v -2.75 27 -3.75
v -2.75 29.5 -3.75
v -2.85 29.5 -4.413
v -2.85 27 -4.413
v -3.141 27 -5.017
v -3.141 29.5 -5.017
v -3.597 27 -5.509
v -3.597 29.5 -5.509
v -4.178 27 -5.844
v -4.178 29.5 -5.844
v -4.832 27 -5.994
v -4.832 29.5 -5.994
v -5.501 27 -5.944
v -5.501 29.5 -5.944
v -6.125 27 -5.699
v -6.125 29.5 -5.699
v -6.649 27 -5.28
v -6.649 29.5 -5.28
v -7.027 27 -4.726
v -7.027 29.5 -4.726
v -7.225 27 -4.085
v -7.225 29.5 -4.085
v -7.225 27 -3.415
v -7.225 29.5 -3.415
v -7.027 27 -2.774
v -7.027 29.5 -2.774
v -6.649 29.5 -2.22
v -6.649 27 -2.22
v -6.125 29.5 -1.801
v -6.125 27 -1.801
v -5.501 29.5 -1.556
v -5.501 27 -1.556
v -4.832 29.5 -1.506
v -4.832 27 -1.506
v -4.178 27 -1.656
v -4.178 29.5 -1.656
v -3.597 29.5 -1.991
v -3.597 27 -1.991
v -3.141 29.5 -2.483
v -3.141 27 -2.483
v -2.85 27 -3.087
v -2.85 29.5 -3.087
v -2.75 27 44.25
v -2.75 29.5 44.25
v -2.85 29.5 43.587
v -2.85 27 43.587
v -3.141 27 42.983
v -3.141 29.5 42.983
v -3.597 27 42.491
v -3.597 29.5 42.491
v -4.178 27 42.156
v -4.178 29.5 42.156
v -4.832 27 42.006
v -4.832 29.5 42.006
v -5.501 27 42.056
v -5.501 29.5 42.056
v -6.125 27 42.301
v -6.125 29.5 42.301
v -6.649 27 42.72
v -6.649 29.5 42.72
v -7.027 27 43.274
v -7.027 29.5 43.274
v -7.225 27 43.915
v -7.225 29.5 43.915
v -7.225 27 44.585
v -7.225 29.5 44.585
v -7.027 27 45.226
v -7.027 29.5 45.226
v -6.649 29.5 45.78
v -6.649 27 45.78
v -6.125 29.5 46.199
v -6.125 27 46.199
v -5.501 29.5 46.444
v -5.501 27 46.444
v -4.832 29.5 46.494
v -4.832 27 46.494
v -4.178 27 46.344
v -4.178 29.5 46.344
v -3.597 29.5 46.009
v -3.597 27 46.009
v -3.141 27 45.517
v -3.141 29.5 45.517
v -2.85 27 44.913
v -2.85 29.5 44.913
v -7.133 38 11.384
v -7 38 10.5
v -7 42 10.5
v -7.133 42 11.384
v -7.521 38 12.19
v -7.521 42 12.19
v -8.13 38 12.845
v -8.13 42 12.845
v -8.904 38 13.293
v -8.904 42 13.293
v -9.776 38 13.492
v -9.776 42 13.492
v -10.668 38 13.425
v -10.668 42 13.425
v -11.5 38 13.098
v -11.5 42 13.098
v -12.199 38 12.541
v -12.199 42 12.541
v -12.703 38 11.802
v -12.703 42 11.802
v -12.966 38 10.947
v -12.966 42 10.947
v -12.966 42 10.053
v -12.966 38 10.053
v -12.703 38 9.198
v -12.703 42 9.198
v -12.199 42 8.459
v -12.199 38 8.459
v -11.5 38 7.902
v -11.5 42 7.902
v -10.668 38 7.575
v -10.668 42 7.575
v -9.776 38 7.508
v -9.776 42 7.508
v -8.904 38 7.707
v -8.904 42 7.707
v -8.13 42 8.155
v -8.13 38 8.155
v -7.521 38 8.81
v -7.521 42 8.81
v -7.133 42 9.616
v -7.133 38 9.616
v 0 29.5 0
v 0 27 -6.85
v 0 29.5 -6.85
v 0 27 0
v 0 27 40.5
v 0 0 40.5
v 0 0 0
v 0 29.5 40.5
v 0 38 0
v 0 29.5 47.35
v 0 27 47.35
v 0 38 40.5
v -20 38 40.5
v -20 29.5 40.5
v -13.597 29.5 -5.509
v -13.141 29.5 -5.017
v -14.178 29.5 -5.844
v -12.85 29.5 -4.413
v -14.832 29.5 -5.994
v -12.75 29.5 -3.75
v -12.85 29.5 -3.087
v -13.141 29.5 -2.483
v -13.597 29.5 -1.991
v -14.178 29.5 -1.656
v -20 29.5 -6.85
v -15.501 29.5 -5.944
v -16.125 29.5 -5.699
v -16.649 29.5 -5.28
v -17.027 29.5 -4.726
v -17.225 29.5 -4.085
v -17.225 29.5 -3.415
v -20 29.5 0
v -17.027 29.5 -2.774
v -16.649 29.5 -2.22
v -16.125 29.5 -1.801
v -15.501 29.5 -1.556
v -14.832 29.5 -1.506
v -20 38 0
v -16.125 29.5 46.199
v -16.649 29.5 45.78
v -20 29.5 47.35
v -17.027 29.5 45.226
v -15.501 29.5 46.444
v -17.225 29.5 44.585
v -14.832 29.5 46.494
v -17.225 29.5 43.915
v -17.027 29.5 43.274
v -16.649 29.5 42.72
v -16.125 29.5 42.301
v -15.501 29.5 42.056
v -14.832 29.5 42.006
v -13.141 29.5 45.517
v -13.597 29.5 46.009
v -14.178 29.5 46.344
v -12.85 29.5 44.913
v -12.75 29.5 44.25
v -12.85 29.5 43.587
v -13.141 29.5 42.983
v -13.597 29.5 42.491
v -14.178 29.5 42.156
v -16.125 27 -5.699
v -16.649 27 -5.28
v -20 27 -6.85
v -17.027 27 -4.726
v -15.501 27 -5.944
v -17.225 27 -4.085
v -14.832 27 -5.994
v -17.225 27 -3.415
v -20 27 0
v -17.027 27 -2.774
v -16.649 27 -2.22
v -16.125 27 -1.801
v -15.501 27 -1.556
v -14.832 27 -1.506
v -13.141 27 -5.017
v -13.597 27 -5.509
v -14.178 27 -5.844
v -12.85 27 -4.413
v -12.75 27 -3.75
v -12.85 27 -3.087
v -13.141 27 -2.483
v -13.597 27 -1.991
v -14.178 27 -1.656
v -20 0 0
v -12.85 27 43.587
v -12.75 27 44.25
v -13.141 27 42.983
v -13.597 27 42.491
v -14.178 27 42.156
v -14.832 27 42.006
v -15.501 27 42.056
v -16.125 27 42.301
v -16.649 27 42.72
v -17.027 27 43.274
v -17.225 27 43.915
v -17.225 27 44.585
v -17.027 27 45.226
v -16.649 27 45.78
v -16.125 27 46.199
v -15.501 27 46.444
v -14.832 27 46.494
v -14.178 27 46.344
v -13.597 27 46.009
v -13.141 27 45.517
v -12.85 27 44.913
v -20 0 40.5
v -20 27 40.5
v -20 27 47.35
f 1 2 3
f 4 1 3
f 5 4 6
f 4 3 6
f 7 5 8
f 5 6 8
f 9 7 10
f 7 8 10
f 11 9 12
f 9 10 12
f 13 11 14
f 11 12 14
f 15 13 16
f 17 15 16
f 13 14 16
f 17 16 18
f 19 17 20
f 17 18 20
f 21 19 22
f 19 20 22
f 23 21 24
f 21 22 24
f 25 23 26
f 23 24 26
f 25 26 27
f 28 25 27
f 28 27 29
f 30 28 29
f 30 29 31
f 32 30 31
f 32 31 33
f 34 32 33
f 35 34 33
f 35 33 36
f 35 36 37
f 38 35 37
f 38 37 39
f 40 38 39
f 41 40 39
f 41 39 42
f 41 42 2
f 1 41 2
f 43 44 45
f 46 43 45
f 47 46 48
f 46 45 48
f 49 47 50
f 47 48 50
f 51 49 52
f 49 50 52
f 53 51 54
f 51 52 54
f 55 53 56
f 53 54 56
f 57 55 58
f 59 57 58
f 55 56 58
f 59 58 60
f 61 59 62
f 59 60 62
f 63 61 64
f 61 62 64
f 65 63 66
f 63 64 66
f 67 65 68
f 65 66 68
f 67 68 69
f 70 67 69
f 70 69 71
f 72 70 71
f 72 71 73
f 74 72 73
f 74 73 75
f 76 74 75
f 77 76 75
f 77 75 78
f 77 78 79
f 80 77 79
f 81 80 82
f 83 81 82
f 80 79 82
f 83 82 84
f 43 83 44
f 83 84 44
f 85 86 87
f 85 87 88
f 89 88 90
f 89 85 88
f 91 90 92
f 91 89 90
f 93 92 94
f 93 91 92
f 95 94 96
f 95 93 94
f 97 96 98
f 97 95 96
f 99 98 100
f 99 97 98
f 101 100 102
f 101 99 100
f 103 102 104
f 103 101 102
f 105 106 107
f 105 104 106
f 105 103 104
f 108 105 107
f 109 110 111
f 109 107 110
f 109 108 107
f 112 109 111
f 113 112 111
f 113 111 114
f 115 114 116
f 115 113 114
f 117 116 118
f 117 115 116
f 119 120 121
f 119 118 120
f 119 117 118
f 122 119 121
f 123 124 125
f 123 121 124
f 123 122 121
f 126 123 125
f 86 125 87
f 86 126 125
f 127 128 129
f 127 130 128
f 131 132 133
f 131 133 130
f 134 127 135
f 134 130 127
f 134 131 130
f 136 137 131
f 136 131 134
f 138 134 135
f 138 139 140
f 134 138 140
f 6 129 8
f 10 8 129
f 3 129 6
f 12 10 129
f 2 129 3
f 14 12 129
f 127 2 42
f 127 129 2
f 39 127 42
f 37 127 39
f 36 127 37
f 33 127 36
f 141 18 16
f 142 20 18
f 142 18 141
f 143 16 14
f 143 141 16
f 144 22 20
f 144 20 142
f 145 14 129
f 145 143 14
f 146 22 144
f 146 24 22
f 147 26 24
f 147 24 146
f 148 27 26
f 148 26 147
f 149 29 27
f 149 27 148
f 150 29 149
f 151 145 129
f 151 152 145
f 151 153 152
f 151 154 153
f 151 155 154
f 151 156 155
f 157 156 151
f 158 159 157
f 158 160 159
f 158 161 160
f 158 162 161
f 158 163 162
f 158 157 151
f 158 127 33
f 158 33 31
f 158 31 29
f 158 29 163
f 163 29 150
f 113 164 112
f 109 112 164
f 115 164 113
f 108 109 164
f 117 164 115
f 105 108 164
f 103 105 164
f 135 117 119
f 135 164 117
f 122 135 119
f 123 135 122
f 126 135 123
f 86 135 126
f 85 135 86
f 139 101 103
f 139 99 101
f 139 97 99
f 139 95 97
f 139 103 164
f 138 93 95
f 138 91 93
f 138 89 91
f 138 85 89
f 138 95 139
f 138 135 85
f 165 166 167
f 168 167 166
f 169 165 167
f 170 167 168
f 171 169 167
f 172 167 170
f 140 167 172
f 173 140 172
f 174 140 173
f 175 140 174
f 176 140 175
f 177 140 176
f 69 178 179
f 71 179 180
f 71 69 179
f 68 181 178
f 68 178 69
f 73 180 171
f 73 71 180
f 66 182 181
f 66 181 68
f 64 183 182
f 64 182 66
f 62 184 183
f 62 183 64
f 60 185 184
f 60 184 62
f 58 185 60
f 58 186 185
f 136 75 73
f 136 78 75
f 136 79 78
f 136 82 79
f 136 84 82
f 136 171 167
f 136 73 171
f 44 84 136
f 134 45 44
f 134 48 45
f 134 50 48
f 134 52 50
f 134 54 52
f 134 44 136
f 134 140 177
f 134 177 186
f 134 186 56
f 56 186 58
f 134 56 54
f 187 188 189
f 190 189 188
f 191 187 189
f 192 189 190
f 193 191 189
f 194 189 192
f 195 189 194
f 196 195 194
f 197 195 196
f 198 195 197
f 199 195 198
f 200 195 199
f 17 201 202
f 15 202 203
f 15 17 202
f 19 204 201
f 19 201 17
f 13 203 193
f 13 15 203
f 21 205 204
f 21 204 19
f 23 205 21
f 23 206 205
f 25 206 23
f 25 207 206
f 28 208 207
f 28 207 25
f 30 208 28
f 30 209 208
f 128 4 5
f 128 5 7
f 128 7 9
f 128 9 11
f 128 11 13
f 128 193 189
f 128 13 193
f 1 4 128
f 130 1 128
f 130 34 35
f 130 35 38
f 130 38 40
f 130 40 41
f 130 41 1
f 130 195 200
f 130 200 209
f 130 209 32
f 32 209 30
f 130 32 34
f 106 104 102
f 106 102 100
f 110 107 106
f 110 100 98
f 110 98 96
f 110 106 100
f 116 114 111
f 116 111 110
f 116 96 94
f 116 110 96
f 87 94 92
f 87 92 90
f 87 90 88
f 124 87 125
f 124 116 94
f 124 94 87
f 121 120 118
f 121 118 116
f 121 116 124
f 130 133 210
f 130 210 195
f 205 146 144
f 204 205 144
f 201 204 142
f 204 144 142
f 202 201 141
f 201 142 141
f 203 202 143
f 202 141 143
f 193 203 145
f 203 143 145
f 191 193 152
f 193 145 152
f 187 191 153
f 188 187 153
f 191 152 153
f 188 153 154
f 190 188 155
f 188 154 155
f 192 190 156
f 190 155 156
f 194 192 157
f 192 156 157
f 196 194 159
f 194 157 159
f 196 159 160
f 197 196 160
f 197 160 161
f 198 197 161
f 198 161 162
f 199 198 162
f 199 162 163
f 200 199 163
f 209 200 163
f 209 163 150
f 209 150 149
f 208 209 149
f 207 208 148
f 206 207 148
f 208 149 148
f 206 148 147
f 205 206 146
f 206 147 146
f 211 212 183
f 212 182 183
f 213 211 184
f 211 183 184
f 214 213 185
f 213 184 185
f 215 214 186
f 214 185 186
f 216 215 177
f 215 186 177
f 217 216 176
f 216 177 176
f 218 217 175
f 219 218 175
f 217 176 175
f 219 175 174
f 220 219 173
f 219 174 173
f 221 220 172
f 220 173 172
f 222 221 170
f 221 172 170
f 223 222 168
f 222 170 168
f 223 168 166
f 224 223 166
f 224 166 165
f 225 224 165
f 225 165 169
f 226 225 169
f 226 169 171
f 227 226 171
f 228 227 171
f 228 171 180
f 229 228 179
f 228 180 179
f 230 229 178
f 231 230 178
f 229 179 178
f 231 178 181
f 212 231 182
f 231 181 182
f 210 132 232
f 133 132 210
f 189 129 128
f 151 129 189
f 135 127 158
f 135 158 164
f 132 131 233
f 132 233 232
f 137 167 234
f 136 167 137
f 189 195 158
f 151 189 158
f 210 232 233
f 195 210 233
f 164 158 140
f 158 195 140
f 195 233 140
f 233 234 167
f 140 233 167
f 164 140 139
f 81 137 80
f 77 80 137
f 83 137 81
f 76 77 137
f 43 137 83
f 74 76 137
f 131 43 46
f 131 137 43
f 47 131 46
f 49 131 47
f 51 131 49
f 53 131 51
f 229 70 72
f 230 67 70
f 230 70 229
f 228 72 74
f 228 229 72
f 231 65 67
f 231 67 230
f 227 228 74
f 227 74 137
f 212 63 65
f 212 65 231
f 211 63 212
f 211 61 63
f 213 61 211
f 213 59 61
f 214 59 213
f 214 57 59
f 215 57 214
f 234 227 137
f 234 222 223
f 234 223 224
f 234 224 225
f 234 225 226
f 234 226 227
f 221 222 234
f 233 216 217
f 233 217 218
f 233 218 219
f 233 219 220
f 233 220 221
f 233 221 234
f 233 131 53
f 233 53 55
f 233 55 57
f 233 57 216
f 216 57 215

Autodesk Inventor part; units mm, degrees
ref_plane "YZ Plane" through (0, 0, 0) normal (1, 0, 0) x (0, 1, 0)
ref_plane "XZ Plane" through (0, 0, 0) normal (0, 1, 0) x (-1, 0, 0)
ref_plane "XY Plane" through (0, 0, 0) normal (0, 0, 1) x (1, 0, 0)
sketch "Sketch1" plane through (0, 0, 0) normal (1, 0, 0) x (0, 1, 0)
  line L0 (38, 40.5) -> (0, 40.5)
  line L1 (0, 40.5) -> (0, 0)
  line L2 (0, 0) -> (38, 0)
  line L3 (38, 0) -> (38, 40.5)
  dimension "d0" = 40.5
  dimension "d1" = 38
extrude "BODY" add sketch "Sketch1" against normal blind 20
sketch "Sketch2" plane through (0, 0, 40.5) normal (0, 0, 1) x (1, 0, 0)
  line L0 (-20, 0) -> (-20, 38) construction
  line L1 (0, 0) -> (-20, 0) construction
  line L2 (0, 27) -> (-20, 27)
  line L3 (-20, 27) -> (-20, 29.5)
  line L4 (-20, 29.5) -> (0, 29.5)
  line L5 (0, 29.5) -> (0, 27)
  dimension "d4" = 27
  dimension "d5" = 2.5
  dimension "d6" = 20
  dimension "d7" = 0
extrude "BRACKET1" add sketch "Sketch2" along normal blind 6.85
sketch "Sketch3" plane through (0, 0, 0) normal (0, 0, -1) x (-1, 0, 0)
  line L0 (0, 0) -> (0, 38) construction
  line L1 (0, 0) -> (20, 0) construction
  line L2 (20, 27) -> (0, 27)
  line L3 (0, 27) -> (0, 29.5)
  line L4 (0, 29.5) -> (20, 29.5)
  line L5 (20, 29.5) -> (20, 27)
  dimension "d10" = 27
  dimension "d11" = 2.5
  dimension "d12" = 0
  dimension "d13" = 20
extrude "BRACKET2" add sketch "Sketch3" along normal blind 6.85
sketch "Sketch4" plane through (-20, 29.5, 40.5) normal (0, 1, 0) x (1, 0, 0)
  line L0 (0, 0) -> (20, 0) construction
  line L1 (20, 0) -> (20, -6.85) construction
  circle A0 centre (5, -3.75) radius 2.25
  circle A1 centre (15, -3.75) radius 2.25
  circle A2 centre (5, 44.25) radius 2.25
  circle A3 centre (15, 44.25) radius 2.25
  line L2 (20, 40.5) -> (20, 47.35) construction
  line L3 (0, 40.5) -> (0, 47.35) construction
  dimension "d16" = 4.5
  dimension "d17" = 4.5
  dimension "d18" = 4.5
  dimension "d19" = 4.5
  dimension "d20" = 48
  dimension "d21" = 48
  dimension "d22" = 10
  dimension "d23" = 5
  dimension "d24" = 5
  dimension "d26" = 10
  dimension "d27" = 3.75
  dimension "d28" = 5
extrude "SCREW_HOLES" cut sketch "Sketch4" against normal blind 10
sketch "Sketch5" plane through (0, 38, 40.5) normal (0, 1, 0) x (1, 0, 0)
  line L0 (-20, 0) -> (-20, 40.5) construction
  line L1 (0, 0) -> (-20, 0) construction
  circle A0 centre (-10, 30) radius 3
  dimension "d31" = 6
  dimension "d32" = 30
  dimension "d33" = 10
extrude "TORQUE_CENTER" add sketch "Sketch5" along normal blind 4
equation "\"d10\" = d4"
equation "\"d11\" = d5"
equation "\"d13\" = d6"
equation "\"d14\" = d8"
equation "\"d17\" = d16"
equation "\"d18\" = d16"
equation "\"d19\" = d16"
equation "\"d8\" = 6.85"
properties part number "JX PDI-HV5932MG-180 digital servo" material "JX PDI-HV5932MG-180 digital servo color"
